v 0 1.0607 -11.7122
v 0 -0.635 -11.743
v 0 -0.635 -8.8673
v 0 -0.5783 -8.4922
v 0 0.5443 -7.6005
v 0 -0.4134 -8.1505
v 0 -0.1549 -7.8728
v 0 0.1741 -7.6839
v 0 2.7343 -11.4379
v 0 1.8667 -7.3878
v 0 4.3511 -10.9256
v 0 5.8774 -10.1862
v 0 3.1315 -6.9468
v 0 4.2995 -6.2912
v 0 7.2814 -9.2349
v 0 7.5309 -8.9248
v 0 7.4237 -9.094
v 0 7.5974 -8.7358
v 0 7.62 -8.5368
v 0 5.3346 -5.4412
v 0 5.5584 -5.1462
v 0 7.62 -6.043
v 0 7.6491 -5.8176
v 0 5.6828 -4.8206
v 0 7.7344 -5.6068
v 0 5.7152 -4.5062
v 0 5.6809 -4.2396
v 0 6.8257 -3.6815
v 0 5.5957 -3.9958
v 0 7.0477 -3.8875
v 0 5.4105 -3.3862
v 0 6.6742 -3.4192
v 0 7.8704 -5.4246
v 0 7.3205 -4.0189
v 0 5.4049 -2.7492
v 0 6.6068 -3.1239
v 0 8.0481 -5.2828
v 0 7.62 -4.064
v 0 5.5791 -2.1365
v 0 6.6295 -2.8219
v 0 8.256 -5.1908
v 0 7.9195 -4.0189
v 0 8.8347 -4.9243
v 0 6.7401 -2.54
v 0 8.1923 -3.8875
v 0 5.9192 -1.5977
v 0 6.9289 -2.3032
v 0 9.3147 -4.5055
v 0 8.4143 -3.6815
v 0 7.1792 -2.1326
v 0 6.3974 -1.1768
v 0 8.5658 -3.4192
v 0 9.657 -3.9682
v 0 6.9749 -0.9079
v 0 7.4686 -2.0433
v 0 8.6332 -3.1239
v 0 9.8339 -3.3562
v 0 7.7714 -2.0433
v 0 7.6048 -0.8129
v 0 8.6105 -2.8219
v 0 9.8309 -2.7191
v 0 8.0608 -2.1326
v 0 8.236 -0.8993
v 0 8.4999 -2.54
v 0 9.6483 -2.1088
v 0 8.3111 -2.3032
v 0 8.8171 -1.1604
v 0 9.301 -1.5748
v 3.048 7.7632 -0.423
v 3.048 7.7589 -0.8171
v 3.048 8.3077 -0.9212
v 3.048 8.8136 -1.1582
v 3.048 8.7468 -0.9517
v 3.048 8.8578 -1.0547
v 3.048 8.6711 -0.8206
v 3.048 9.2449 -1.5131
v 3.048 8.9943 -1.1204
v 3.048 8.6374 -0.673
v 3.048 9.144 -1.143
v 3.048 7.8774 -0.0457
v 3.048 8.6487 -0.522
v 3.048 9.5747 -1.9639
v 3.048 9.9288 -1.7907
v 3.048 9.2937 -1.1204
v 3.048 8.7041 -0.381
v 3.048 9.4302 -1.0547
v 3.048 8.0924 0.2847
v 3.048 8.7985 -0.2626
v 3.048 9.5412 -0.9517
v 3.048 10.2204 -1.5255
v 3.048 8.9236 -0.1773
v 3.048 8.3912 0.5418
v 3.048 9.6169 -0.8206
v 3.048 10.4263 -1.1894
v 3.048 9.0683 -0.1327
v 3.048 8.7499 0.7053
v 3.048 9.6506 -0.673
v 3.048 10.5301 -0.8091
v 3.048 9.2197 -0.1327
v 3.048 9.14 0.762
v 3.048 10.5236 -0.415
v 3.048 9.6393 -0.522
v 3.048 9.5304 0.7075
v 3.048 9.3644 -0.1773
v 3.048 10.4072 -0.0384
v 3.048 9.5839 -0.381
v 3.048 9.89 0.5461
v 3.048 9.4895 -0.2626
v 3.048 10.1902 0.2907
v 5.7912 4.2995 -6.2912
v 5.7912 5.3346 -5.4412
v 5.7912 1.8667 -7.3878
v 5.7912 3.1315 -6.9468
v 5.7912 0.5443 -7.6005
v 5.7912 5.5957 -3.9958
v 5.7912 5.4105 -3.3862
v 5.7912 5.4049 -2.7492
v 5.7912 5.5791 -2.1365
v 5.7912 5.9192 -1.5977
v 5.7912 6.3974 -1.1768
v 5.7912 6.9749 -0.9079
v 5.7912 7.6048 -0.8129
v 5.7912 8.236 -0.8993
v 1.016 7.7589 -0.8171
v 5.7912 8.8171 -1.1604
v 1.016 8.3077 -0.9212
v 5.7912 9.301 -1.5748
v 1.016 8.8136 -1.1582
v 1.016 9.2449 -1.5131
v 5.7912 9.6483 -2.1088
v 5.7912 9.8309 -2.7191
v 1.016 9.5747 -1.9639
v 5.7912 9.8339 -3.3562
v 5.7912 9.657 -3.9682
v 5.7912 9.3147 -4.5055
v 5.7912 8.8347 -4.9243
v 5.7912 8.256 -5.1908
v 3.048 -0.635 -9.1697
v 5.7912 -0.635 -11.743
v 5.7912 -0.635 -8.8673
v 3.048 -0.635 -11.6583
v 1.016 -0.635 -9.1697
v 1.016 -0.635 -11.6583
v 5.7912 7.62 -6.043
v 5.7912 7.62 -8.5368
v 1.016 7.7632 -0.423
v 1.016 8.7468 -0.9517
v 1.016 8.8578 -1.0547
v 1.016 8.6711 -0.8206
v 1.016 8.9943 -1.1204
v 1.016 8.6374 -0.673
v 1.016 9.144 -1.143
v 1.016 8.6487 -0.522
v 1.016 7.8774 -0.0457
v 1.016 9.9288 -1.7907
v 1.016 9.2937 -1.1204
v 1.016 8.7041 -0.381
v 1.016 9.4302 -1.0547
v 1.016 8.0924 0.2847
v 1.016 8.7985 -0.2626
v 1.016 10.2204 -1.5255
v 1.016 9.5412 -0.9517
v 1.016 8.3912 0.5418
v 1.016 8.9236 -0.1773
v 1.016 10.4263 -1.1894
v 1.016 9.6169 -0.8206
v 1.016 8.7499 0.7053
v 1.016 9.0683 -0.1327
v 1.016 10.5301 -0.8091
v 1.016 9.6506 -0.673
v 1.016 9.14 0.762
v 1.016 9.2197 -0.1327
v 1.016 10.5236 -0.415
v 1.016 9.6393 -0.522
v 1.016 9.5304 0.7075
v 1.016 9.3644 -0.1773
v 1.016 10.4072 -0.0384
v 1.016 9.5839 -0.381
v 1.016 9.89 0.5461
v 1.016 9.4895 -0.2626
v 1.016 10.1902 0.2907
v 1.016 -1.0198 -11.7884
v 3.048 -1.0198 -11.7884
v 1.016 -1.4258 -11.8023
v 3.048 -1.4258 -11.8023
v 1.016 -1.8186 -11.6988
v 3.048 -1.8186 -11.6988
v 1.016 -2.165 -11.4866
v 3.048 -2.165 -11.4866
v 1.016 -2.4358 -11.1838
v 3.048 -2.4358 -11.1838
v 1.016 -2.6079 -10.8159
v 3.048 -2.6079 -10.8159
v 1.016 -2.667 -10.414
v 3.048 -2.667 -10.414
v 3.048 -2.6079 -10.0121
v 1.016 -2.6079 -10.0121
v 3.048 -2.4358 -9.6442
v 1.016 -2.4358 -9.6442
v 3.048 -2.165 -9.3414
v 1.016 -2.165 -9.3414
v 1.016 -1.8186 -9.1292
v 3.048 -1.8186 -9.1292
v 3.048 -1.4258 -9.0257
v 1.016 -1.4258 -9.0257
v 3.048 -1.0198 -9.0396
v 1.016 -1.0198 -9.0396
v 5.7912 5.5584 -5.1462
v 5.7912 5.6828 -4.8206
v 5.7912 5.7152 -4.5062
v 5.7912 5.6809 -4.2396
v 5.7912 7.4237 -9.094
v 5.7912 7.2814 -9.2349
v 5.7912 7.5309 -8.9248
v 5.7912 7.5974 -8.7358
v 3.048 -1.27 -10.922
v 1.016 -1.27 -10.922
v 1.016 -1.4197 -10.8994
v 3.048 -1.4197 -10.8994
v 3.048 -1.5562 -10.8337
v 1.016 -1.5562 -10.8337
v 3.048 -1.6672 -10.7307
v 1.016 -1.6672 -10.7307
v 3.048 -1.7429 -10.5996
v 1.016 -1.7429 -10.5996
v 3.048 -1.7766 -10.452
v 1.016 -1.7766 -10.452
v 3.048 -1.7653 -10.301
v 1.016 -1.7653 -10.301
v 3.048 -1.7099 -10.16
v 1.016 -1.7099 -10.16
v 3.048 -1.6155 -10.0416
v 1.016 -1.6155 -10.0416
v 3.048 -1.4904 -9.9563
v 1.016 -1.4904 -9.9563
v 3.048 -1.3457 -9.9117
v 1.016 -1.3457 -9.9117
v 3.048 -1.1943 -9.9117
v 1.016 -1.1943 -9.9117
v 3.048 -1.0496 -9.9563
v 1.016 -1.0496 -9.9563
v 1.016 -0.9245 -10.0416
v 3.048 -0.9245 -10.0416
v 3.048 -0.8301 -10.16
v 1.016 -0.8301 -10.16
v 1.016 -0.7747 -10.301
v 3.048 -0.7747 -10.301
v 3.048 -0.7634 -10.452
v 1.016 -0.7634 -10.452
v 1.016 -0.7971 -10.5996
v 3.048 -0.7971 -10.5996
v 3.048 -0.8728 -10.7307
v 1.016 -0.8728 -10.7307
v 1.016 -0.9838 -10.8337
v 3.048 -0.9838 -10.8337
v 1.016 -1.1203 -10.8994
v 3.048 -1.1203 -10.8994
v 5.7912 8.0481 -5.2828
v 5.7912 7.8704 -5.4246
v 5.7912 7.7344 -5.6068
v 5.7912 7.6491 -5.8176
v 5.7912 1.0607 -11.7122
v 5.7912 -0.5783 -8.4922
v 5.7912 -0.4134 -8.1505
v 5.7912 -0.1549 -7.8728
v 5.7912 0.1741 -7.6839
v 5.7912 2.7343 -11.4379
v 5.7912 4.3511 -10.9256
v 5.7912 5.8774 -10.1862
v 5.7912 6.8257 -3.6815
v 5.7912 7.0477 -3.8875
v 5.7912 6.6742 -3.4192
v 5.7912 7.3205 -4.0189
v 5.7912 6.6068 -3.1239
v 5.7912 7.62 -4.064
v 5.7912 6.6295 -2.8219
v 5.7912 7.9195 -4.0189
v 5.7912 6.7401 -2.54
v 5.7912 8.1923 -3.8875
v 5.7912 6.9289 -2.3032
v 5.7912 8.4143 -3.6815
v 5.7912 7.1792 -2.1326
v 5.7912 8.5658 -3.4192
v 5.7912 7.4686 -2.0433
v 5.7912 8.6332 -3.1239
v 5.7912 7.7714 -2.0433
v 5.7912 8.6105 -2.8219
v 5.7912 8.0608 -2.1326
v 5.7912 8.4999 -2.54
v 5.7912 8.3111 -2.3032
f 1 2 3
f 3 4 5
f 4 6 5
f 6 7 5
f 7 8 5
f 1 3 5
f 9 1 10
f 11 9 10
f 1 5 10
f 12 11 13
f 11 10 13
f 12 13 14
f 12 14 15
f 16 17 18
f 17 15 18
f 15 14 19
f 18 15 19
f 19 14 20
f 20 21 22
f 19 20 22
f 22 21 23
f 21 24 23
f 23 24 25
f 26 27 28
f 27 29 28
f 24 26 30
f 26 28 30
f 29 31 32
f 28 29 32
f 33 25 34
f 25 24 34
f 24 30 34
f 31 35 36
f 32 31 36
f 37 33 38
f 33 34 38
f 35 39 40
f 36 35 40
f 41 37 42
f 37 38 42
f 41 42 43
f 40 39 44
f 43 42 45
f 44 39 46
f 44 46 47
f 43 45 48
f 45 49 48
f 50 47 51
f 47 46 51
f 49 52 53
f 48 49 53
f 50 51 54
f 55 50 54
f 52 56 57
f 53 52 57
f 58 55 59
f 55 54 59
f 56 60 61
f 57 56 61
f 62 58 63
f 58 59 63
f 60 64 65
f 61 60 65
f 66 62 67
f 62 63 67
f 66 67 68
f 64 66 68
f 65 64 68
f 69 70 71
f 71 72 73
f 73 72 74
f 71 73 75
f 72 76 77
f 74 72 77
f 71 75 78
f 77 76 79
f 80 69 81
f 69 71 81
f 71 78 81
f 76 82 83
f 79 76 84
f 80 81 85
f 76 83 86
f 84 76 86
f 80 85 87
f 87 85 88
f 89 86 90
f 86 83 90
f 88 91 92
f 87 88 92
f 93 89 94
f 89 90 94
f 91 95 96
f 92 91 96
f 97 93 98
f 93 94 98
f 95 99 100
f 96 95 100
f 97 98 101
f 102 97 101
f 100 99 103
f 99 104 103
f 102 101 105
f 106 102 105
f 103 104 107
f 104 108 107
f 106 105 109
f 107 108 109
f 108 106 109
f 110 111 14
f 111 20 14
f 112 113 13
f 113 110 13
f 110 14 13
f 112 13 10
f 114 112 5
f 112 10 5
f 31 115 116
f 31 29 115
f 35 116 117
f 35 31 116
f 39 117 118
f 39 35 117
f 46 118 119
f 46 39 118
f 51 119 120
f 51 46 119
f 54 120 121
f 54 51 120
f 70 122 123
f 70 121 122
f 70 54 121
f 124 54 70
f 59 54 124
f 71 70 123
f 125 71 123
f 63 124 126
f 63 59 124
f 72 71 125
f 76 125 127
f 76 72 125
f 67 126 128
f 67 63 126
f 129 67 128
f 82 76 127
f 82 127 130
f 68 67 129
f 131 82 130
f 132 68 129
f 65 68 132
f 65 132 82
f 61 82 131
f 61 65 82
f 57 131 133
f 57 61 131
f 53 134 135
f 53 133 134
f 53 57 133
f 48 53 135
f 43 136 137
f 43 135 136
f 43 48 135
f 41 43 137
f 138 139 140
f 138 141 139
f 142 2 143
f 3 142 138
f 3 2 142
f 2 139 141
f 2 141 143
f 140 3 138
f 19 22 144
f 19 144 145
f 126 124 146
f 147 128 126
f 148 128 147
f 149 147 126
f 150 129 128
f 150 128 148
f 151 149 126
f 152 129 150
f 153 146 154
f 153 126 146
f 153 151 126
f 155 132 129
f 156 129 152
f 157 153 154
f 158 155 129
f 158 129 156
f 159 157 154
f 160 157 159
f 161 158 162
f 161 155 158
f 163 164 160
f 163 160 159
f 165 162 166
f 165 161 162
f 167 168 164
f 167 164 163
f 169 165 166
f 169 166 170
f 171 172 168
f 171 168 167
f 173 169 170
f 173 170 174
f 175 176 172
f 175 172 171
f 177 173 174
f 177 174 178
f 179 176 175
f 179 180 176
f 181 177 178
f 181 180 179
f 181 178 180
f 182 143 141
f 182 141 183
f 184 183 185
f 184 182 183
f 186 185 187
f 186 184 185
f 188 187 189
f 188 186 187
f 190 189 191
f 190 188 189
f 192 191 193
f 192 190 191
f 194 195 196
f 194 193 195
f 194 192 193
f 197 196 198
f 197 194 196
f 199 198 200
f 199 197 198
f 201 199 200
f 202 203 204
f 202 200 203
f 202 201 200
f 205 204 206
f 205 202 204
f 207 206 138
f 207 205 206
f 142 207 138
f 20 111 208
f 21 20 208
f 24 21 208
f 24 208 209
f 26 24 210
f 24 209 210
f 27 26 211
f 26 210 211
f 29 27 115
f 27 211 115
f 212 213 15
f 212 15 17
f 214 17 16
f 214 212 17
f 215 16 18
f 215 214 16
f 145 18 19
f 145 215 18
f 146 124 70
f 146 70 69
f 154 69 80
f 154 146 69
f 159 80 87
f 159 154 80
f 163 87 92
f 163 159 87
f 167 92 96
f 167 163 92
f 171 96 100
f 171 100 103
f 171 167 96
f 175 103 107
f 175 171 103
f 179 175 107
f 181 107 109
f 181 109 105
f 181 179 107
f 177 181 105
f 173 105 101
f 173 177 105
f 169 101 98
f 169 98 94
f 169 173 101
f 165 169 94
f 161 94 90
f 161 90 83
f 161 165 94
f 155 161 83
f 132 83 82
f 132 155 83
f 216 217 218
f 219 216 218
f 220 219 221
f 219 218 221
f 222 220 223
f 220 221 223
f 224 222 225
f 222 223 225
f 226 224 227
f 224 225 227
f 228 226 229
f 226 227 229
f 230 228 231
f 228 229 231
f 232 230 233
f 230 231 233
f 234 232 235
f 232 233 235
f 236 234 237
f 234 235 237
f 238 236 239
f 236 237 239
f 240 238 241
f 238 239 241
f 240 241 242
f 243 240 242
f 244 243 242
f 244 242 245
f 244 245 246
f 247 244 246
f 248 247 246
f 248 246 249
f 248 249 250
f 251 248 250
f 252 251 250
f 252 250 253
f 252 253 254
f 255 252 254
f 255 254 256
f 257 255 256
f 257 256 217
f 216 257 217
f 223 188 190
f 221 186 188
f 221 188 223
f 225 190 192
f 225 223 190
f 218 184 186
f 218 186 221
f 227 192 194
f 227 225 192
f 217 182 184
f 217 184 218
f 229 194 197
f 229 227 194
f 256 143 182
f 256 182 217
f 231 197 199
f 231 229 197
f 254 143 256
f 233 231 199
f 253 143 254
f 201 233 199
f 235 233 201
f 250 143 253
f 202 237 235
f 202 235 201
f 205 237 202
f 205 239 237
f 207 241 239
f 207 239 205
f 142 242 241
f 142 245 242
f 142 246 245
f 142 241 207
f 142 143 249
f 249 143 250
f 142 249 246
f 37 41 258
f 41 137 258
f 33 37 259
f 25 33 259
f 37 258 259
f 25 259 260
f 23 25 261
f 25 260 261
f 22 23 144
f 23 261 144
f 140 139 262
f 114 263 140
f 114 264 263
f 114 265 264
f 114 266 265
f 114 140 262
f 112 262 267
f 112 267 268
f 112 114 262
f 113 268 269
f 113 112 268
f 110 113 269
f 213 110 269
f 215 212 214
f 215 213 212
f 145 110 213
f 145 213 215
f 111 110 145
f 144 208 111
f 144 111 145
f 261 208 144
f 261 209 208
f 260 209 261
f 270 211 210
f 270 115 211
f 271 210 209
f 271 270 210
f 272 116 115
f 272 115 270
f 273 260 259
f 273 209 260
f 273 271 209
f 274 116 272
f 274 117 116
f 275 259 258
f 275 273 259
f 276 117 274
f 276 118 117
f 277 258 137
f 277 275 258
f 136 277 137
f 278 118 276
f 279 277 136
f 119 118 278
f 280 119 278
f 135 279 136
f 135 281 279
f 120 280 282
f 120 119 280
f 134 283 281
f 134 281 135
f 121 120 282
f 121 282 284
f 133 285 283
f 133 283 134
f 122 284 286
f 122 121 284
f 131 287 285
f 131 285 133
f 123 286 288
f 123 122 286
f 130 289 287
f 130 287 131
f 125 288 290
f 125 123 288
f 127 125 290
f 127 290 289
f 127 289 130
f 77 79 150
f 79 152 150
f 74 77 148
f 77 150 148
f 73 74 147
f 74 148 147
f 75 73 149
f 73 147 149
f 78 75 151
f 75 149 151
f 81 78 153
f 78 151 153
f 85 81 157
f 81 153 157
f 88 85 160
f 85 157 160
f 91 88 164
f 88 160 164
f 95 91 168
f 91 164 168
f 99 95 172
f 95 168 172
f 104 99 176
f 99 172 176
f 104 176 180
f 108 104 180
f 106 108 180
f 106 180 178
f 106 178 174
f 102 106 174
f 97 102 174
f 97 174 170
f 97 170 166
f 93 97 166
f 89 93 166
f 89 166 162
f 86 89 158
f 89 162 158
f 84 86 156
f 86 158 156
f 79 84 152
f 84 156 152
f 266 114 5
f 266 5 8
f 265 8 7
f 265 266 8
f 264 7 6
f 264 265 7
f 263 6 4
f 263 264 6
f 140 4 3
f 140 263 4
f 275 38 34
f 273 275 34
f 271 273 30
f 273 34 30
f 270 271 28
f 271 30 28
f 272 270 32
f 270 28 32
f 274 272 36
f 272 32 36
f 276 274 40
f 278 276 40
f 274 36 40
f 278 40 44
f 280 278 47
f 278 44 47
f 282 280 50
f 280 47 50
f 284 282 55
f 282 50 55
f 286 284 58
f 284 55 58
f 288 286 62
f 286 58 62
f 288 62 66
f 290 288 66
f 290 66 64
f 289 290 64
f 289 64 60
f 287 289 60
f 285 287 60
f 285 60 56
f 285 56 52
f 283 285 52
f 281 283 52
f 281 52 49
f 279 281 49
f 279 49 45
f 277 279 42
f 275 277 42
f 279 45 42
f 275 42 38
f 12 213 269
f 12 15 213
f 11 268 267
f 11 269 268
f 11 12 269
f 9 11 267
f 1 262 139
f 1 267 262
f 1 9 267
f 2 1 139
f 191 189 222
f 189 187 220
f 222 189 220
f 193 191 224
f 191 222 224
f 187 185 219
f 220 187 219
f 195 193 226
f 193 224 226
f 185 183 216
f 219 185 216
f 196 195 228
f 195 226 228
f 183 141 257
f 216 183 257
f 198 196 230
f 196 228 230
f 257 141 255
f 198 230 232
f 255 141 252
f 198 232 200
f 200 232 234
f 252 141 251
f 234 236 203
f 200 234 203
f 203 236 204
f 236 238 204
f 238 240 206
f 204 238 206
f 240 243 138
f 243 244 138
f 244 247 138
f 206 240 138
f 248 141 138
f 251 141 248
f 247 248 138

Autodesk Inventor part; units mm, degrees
ref_plane "YZ Plane" through (0, 0, 0) normal (1, 0, 0) x (0, 1, 0)
ref_plane "XZ Plane" through (0, 0, 0) normal (0, 1, 0) x (-1, 0, 0)
ref_plane "XY Plane" through (0, 0, 0) normal (0, 0, 1) x (1, 0, 0)
sketch "Sketch1" plane through (0, 0, 0) normal (1, 0, 0) x (0, 1, 0)
  arc A0 (-0.635, -11.743) -> (7.62, -8.9576) centre (0, 0) ccw
  arc A1 (-0.635, -7.5935) -> (6.0473, -4.6363) centre (0, 0) ccw
  circle A2 centre (7.62, -3.048) radius 2.2352
  line L0 (7.62, -5.2832) -> (7.62, -8.9576)
  line L1 (-0.635, -11.743) -> (-0.635, -7.5935)
  dimension "d0" = 11.7602
  dimension "d1" = 7.62
  dimension "d8" = 2.2352
  dimension "d9" = 7.62
  dimension "d10" = 3.048
  dimension "d11" = 0.635
extrude "Extrusion1" add sketch "Sketch1" along normal blind 5.7912
fillet "Fillet1" radius 1.27 1 edges at (2.8956, 6.0473, -4.6363)
fillet "Fillet2" radius 0.889 1 edges at (2.8956, 7.62, -5.2832)
fillet "Fillet3" radius 0.889 1 edges at (2.8956, 7.62, -8.9576)
ref_plane "Work Plane1" through (1.016, 0, 0) normal (-1, 0, 0) x (0, 0, 1)
sketch "Sketch2" plane through (1.016, 0, 0) normal (-1, 0, 0) x (0, 0, 1)
  arc A0 (-3.9958, 5.5957) -> (-5.4412, 5.3346) centre (-4.5343, 4.4455) ccw projected
  arc A1 (-5.4412, 5.3346) -> (-7.5935, -0.635) centre (0, 0) ccw projected
  line L0 (-7.5935, -0.635) -> (-11.743, -0.635) projected
  arc A2 (-9.2349, 7.2814) -> (-11.743, -0.635) centre (0, 0) ccw projected
  arc A3 (-8.5368, 7.62) -> (-9.2349, 7.2814) centre (-8.5368, 6.731) ccw projected
  line L1 (-8.5368, 7.62) -> (-6.043, 7.62) projected
  arc A4 (-6.043, 7.62) -> (-5.1908, 8.256) centre (-6.043, 8.509) ccw projected
  arc A5 (-3.9958, 5.5957) -> (-5.1908, 8.256) centre (-3.048, 7.62) ccw projected
  circle A6 centre (-10.414, -1.27) radius 1.397
  circle A7 centre (-0.635, 9.144) radius 1.397
  dimension "d18" = 1.397
  dimension "d19" = 1.27
  dimension "d20" = 10.414
  dimension "d21" = 1.397
  dimension "d22" = 0.635
  dimension "d23" = 9.144
extrude "Extrusion2" add sketch "Sketch2" against normal blind 2.032 contours A7 A5 | A5 A7 | A6 L0 | L0 A6
fillet "Fillet4" radius 1.27 1 edges at (2.8956, -0.635, -7.5935)
sketch "Sketch3" plane through (3.048, 0, 0) normal (1, 0, 0) x (0, 0, -1)
  arc A0 (1.9639, 9.5747) -> (0.8171, 7.7589) centre (0.635, 9.144) ccw projected
  line L0 (9.1697, -0.635) -> (11.6583, -0.635) projected
  arc A1 (9.1697, -0.635) -> (11.6583, -0.635) centre (10.414, -1.27) ccw projected
  point P0 (0, 0)
hole "Hole1" at (3.048, -1.27, -10.414) at (3.048, 9.144, -0.635) direction (-1, 0, 0) diameter 1.016 end through all
sketch "Sketch4" plane through (5.7912, 0, 0) normal (1, 0, 0) x (0, 0, -1)
  arc A0 (5.1908, 8.256) -> (3.9958, 5.5957) centre (3.048, 7.62) ccw projected
hole "Hole2" at (5.7912, 7.62, -3.048) direction (-1, 0, 0) diameter 2.032 end through all
properties part number "Brake Pad"
